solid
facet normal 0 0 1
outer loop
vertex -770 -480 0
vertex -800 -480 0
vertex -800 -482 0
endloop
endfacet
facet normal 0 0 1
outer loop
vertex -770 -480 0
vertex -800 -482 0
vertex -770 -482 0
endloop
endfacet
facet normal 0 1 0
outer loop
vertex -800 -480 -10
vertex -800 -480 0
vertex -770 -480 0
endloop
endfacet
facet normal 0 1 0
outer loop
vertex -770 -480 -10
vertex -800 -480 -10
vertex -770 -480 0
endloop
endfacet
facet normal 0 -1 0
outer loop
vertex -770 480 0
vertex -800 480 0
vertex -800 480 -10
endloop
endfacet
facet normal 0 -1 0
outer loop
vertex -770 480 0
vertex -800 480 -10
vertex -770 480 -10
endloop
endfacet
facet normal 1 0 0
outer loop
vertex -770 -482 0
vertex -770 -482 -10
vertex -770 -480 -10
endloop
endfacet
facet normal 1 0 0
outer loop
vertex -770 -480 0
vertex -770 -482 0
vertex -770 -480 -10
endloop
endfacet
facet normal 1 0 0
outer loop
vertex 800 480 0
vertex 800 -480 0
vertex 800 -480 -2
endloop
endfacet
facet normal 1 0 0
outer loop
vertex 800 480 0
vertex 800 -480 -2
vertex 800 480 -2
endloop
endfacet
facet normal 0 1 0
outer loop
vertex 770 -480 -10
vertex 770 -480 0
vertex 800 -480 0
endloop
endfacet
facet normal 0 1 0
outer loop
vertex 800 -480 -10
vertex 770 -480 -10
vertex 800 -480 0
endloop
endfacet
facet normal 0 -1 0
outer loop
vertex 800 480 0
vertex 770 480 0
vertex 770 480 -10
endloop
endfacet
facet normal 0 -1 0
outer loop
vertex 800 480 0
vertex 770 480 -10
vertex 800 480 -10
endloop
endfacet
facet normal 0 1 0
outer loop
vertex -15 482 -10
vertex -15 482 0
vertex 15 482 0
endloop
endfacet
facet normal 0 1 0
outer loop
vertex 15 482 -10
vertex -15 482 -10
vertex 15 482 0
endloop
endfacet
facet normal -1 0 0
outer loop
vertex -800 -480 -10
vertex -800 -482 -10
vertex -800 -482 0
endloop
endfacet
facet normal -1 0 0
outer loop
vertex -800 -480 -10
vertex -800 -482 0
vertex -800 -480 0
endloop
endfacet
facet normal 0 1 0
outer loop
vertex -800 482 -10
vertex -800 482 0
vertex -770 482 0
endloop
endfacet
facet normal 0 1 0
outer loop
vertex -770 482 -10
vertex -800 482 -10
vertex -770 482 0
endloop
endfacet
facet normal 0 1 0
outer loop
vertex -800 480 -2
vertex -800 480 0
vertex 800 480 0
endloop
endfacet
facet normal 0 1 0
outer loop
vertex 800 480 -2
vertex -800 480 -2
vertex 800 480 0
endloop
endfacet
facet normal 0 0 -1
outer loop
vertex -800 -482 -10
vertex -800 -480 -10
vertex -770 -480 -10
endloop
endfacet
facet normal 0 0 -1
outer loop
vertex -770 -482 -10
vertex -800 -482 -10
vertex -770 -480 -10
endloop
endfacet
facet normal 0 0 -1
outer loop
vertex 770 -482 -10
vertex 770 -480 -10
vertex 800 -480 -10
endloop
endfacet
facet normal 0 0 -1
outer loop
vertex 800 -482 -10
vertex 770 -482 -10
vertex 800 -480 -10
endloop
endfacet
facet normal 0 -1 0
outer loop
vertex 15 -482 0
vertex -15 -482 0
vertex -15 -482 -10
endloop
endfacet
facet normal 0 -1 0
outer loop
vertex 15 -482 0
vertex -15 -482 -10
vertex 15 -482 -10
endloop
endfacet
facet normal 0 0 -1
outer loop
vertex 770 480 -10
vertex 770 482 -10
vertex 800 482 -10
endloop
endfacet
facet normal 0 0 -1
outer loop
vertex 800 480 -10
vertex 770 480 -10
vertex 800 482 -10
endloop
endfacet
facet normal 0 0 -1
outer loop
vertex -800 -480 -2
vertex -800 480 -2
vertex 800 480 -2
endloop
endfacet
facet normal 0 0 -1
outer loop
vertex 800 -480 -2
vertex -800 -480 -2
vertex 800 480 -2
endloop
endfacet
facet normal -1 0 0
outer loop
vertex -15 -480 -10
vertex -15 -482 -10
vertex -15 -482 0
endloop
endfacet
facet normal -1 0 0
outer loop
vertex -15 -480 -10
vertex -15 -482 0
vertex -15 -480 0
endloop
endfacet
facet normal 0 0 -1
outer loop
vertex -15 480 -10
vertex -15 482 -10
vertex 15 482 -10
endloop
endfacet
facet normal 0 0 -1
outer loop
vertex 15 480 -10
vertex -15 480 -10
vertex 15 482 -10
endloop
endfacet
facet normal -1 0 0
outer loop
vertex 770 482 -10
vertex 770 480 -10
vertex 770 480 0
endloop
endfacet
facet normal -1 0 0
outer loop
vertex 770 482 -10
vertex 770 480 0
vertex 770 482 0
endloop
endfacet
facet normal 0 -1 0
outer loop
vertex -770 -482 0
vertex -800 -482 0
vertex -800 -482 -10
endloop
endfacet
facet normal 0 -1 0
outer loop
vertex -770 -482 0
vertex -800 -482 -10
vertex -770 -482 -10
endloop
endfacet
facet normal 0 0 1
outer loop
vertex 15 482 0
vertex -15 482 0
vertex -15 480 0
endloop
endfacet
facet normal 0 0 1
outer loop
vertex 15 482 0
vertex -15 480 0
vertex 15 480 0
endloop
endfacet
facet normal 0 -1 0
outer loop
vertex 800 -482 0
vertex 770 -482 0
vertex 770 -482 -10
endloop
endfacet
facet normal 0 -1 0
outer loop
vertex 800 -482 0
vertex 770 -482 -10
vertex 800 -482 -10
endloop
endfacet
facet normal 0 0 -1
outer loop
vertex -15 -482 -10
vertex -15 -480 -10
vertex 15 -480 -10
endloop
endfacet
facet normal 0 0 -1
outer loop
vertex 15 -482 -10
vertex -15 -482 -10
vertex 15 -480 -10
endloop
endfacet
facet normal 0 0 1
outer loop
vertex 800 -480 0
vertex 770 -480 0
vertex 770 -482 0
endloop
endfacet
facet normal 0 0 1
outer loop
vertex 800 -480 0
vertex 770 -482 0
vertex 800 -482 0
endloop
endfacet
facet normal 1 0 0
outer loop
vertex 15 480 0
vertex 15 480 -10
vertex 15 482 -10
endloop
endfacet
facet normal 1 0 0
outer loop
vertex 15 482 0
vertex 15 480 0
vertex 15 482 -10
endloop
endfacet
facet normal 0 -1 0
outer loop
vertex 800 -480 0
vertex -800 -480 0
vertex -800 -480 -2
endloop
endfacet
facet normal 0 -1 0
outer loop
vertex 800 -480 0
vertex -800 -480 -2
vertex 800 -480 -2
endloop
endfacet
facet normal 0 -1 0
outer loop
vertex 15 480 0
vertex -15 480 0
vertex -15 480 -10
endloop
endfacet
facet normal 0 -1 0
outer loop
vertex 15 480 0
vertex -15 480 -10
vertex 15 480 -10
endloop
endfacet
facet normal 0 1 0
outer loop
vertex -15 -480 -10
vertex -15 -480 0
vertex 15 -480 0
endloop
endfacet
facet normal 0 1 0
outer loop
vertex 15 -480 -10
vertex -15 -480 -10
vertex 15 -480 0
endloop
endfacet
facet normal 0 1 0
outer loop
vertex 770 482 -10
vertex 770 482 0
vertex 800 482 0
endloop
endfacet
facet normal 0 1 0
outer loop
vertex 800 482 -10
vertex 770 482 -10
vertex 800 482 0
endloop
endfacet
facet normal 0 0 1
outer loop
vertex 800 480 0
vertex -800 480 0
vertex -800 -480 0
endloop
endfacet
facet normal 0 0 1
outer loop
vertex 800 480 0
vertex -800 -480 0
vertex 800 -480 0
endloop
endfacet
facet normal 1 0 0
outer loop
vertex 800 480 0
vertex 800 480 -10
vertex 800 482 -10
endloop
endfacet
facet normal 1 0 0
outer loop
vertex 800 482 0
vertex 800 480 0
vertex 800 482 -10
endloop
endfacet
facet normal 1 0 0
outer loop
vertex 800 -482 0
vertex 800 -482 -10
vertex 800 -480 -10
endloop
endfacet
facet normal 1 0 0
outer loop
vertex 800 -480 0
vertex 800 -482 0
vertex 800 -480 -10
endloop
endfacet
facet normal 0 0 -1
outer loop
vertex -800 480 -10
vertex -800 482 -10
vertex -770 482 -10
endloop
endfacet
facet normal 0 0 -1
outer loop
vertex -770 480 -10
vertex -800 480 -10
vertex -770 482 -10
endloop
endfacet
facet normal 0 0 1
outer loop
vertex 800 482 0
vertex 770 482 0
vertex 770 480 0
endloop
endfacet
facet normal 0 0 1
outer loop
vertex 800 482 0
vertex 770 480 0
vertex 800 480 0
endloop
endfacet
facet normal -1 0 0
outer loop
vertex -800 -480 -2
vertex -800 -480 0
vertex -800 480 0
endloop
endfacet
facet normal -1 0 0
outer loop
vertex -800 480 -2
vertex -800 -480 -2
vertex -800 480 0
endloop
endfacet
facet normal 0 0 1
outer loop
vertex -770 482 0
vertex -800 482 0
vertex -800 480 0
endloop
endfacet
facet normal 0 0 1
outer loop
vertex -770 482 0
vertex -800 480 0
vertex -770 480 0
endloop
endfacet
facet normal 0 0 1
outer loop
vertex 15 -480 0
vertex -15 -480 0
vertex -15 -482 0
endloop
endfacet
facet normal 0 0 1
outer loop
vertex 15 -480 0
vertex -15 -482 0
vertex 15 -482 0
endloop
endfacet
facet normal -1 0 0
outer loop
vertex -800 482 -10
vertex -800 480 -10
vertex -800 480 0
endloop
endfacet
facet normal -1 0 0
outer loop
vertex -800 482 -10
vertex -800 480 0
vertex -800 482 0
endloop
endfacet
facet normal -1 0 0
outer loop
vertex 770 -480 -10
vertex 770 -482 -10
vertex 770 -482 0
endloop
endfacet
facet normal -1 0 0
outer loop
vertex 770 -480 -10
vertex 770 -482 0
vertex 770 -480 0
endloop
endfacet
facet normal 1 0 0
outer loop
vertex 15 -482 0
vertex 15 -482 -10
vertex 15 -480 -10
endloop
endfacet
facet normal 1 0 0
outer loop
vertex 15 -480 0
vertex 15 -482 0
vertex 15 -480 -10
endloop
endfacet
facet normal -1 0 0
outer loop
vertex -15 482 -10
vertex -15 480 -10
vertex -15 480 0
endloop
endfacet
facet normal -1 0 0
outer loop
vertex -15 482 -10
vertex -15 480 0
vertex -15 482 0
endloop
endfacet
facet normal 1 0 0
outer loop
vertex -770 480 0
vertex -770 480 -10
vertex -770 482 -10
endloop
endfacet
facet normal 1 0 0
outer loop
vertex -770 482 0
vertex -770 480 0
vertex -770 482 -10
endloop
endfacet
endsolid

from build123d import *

# Parameters (mm, degrees)
F0_W     = 1600
F0_H     = 960
F1_DEPTH = 2
F2_W     = 30
F2_H     = 2
F3_DEPTH = 10


with BuildPart() as f1:
    # F0 (on Top) → F1 (new body)
    with BuildSketch(Plane.XY):
        Rectangle(F0_W, F0_H)
    extrude(amount=-F1_DEPTH)


with BuildPart() as f3:
    # F2 (on face) → F3 (new body)
    with BuildSketch(Plane.XY):
        with Locations((0, 481)):
            Rectangle(F2_W, F2_H)
        with Locations((785, 481)):
            Rectangle(F2_W, F2_H)
        with Locations((-785, 481)):
            Rectangle(F2_W, F2_H)
        with Locations((0, -481)):
            Rectangle(F2_W, F2_H)
        with Locations((785, -481)):
            Rectangle(F2_W, F2_H)
        with Locations((-785, -481)):
            Rectangle(F2_W, F2_H)
    extrude(amount=-F3_DEPTH)


solid = Compound([f1.part, f3.part])
